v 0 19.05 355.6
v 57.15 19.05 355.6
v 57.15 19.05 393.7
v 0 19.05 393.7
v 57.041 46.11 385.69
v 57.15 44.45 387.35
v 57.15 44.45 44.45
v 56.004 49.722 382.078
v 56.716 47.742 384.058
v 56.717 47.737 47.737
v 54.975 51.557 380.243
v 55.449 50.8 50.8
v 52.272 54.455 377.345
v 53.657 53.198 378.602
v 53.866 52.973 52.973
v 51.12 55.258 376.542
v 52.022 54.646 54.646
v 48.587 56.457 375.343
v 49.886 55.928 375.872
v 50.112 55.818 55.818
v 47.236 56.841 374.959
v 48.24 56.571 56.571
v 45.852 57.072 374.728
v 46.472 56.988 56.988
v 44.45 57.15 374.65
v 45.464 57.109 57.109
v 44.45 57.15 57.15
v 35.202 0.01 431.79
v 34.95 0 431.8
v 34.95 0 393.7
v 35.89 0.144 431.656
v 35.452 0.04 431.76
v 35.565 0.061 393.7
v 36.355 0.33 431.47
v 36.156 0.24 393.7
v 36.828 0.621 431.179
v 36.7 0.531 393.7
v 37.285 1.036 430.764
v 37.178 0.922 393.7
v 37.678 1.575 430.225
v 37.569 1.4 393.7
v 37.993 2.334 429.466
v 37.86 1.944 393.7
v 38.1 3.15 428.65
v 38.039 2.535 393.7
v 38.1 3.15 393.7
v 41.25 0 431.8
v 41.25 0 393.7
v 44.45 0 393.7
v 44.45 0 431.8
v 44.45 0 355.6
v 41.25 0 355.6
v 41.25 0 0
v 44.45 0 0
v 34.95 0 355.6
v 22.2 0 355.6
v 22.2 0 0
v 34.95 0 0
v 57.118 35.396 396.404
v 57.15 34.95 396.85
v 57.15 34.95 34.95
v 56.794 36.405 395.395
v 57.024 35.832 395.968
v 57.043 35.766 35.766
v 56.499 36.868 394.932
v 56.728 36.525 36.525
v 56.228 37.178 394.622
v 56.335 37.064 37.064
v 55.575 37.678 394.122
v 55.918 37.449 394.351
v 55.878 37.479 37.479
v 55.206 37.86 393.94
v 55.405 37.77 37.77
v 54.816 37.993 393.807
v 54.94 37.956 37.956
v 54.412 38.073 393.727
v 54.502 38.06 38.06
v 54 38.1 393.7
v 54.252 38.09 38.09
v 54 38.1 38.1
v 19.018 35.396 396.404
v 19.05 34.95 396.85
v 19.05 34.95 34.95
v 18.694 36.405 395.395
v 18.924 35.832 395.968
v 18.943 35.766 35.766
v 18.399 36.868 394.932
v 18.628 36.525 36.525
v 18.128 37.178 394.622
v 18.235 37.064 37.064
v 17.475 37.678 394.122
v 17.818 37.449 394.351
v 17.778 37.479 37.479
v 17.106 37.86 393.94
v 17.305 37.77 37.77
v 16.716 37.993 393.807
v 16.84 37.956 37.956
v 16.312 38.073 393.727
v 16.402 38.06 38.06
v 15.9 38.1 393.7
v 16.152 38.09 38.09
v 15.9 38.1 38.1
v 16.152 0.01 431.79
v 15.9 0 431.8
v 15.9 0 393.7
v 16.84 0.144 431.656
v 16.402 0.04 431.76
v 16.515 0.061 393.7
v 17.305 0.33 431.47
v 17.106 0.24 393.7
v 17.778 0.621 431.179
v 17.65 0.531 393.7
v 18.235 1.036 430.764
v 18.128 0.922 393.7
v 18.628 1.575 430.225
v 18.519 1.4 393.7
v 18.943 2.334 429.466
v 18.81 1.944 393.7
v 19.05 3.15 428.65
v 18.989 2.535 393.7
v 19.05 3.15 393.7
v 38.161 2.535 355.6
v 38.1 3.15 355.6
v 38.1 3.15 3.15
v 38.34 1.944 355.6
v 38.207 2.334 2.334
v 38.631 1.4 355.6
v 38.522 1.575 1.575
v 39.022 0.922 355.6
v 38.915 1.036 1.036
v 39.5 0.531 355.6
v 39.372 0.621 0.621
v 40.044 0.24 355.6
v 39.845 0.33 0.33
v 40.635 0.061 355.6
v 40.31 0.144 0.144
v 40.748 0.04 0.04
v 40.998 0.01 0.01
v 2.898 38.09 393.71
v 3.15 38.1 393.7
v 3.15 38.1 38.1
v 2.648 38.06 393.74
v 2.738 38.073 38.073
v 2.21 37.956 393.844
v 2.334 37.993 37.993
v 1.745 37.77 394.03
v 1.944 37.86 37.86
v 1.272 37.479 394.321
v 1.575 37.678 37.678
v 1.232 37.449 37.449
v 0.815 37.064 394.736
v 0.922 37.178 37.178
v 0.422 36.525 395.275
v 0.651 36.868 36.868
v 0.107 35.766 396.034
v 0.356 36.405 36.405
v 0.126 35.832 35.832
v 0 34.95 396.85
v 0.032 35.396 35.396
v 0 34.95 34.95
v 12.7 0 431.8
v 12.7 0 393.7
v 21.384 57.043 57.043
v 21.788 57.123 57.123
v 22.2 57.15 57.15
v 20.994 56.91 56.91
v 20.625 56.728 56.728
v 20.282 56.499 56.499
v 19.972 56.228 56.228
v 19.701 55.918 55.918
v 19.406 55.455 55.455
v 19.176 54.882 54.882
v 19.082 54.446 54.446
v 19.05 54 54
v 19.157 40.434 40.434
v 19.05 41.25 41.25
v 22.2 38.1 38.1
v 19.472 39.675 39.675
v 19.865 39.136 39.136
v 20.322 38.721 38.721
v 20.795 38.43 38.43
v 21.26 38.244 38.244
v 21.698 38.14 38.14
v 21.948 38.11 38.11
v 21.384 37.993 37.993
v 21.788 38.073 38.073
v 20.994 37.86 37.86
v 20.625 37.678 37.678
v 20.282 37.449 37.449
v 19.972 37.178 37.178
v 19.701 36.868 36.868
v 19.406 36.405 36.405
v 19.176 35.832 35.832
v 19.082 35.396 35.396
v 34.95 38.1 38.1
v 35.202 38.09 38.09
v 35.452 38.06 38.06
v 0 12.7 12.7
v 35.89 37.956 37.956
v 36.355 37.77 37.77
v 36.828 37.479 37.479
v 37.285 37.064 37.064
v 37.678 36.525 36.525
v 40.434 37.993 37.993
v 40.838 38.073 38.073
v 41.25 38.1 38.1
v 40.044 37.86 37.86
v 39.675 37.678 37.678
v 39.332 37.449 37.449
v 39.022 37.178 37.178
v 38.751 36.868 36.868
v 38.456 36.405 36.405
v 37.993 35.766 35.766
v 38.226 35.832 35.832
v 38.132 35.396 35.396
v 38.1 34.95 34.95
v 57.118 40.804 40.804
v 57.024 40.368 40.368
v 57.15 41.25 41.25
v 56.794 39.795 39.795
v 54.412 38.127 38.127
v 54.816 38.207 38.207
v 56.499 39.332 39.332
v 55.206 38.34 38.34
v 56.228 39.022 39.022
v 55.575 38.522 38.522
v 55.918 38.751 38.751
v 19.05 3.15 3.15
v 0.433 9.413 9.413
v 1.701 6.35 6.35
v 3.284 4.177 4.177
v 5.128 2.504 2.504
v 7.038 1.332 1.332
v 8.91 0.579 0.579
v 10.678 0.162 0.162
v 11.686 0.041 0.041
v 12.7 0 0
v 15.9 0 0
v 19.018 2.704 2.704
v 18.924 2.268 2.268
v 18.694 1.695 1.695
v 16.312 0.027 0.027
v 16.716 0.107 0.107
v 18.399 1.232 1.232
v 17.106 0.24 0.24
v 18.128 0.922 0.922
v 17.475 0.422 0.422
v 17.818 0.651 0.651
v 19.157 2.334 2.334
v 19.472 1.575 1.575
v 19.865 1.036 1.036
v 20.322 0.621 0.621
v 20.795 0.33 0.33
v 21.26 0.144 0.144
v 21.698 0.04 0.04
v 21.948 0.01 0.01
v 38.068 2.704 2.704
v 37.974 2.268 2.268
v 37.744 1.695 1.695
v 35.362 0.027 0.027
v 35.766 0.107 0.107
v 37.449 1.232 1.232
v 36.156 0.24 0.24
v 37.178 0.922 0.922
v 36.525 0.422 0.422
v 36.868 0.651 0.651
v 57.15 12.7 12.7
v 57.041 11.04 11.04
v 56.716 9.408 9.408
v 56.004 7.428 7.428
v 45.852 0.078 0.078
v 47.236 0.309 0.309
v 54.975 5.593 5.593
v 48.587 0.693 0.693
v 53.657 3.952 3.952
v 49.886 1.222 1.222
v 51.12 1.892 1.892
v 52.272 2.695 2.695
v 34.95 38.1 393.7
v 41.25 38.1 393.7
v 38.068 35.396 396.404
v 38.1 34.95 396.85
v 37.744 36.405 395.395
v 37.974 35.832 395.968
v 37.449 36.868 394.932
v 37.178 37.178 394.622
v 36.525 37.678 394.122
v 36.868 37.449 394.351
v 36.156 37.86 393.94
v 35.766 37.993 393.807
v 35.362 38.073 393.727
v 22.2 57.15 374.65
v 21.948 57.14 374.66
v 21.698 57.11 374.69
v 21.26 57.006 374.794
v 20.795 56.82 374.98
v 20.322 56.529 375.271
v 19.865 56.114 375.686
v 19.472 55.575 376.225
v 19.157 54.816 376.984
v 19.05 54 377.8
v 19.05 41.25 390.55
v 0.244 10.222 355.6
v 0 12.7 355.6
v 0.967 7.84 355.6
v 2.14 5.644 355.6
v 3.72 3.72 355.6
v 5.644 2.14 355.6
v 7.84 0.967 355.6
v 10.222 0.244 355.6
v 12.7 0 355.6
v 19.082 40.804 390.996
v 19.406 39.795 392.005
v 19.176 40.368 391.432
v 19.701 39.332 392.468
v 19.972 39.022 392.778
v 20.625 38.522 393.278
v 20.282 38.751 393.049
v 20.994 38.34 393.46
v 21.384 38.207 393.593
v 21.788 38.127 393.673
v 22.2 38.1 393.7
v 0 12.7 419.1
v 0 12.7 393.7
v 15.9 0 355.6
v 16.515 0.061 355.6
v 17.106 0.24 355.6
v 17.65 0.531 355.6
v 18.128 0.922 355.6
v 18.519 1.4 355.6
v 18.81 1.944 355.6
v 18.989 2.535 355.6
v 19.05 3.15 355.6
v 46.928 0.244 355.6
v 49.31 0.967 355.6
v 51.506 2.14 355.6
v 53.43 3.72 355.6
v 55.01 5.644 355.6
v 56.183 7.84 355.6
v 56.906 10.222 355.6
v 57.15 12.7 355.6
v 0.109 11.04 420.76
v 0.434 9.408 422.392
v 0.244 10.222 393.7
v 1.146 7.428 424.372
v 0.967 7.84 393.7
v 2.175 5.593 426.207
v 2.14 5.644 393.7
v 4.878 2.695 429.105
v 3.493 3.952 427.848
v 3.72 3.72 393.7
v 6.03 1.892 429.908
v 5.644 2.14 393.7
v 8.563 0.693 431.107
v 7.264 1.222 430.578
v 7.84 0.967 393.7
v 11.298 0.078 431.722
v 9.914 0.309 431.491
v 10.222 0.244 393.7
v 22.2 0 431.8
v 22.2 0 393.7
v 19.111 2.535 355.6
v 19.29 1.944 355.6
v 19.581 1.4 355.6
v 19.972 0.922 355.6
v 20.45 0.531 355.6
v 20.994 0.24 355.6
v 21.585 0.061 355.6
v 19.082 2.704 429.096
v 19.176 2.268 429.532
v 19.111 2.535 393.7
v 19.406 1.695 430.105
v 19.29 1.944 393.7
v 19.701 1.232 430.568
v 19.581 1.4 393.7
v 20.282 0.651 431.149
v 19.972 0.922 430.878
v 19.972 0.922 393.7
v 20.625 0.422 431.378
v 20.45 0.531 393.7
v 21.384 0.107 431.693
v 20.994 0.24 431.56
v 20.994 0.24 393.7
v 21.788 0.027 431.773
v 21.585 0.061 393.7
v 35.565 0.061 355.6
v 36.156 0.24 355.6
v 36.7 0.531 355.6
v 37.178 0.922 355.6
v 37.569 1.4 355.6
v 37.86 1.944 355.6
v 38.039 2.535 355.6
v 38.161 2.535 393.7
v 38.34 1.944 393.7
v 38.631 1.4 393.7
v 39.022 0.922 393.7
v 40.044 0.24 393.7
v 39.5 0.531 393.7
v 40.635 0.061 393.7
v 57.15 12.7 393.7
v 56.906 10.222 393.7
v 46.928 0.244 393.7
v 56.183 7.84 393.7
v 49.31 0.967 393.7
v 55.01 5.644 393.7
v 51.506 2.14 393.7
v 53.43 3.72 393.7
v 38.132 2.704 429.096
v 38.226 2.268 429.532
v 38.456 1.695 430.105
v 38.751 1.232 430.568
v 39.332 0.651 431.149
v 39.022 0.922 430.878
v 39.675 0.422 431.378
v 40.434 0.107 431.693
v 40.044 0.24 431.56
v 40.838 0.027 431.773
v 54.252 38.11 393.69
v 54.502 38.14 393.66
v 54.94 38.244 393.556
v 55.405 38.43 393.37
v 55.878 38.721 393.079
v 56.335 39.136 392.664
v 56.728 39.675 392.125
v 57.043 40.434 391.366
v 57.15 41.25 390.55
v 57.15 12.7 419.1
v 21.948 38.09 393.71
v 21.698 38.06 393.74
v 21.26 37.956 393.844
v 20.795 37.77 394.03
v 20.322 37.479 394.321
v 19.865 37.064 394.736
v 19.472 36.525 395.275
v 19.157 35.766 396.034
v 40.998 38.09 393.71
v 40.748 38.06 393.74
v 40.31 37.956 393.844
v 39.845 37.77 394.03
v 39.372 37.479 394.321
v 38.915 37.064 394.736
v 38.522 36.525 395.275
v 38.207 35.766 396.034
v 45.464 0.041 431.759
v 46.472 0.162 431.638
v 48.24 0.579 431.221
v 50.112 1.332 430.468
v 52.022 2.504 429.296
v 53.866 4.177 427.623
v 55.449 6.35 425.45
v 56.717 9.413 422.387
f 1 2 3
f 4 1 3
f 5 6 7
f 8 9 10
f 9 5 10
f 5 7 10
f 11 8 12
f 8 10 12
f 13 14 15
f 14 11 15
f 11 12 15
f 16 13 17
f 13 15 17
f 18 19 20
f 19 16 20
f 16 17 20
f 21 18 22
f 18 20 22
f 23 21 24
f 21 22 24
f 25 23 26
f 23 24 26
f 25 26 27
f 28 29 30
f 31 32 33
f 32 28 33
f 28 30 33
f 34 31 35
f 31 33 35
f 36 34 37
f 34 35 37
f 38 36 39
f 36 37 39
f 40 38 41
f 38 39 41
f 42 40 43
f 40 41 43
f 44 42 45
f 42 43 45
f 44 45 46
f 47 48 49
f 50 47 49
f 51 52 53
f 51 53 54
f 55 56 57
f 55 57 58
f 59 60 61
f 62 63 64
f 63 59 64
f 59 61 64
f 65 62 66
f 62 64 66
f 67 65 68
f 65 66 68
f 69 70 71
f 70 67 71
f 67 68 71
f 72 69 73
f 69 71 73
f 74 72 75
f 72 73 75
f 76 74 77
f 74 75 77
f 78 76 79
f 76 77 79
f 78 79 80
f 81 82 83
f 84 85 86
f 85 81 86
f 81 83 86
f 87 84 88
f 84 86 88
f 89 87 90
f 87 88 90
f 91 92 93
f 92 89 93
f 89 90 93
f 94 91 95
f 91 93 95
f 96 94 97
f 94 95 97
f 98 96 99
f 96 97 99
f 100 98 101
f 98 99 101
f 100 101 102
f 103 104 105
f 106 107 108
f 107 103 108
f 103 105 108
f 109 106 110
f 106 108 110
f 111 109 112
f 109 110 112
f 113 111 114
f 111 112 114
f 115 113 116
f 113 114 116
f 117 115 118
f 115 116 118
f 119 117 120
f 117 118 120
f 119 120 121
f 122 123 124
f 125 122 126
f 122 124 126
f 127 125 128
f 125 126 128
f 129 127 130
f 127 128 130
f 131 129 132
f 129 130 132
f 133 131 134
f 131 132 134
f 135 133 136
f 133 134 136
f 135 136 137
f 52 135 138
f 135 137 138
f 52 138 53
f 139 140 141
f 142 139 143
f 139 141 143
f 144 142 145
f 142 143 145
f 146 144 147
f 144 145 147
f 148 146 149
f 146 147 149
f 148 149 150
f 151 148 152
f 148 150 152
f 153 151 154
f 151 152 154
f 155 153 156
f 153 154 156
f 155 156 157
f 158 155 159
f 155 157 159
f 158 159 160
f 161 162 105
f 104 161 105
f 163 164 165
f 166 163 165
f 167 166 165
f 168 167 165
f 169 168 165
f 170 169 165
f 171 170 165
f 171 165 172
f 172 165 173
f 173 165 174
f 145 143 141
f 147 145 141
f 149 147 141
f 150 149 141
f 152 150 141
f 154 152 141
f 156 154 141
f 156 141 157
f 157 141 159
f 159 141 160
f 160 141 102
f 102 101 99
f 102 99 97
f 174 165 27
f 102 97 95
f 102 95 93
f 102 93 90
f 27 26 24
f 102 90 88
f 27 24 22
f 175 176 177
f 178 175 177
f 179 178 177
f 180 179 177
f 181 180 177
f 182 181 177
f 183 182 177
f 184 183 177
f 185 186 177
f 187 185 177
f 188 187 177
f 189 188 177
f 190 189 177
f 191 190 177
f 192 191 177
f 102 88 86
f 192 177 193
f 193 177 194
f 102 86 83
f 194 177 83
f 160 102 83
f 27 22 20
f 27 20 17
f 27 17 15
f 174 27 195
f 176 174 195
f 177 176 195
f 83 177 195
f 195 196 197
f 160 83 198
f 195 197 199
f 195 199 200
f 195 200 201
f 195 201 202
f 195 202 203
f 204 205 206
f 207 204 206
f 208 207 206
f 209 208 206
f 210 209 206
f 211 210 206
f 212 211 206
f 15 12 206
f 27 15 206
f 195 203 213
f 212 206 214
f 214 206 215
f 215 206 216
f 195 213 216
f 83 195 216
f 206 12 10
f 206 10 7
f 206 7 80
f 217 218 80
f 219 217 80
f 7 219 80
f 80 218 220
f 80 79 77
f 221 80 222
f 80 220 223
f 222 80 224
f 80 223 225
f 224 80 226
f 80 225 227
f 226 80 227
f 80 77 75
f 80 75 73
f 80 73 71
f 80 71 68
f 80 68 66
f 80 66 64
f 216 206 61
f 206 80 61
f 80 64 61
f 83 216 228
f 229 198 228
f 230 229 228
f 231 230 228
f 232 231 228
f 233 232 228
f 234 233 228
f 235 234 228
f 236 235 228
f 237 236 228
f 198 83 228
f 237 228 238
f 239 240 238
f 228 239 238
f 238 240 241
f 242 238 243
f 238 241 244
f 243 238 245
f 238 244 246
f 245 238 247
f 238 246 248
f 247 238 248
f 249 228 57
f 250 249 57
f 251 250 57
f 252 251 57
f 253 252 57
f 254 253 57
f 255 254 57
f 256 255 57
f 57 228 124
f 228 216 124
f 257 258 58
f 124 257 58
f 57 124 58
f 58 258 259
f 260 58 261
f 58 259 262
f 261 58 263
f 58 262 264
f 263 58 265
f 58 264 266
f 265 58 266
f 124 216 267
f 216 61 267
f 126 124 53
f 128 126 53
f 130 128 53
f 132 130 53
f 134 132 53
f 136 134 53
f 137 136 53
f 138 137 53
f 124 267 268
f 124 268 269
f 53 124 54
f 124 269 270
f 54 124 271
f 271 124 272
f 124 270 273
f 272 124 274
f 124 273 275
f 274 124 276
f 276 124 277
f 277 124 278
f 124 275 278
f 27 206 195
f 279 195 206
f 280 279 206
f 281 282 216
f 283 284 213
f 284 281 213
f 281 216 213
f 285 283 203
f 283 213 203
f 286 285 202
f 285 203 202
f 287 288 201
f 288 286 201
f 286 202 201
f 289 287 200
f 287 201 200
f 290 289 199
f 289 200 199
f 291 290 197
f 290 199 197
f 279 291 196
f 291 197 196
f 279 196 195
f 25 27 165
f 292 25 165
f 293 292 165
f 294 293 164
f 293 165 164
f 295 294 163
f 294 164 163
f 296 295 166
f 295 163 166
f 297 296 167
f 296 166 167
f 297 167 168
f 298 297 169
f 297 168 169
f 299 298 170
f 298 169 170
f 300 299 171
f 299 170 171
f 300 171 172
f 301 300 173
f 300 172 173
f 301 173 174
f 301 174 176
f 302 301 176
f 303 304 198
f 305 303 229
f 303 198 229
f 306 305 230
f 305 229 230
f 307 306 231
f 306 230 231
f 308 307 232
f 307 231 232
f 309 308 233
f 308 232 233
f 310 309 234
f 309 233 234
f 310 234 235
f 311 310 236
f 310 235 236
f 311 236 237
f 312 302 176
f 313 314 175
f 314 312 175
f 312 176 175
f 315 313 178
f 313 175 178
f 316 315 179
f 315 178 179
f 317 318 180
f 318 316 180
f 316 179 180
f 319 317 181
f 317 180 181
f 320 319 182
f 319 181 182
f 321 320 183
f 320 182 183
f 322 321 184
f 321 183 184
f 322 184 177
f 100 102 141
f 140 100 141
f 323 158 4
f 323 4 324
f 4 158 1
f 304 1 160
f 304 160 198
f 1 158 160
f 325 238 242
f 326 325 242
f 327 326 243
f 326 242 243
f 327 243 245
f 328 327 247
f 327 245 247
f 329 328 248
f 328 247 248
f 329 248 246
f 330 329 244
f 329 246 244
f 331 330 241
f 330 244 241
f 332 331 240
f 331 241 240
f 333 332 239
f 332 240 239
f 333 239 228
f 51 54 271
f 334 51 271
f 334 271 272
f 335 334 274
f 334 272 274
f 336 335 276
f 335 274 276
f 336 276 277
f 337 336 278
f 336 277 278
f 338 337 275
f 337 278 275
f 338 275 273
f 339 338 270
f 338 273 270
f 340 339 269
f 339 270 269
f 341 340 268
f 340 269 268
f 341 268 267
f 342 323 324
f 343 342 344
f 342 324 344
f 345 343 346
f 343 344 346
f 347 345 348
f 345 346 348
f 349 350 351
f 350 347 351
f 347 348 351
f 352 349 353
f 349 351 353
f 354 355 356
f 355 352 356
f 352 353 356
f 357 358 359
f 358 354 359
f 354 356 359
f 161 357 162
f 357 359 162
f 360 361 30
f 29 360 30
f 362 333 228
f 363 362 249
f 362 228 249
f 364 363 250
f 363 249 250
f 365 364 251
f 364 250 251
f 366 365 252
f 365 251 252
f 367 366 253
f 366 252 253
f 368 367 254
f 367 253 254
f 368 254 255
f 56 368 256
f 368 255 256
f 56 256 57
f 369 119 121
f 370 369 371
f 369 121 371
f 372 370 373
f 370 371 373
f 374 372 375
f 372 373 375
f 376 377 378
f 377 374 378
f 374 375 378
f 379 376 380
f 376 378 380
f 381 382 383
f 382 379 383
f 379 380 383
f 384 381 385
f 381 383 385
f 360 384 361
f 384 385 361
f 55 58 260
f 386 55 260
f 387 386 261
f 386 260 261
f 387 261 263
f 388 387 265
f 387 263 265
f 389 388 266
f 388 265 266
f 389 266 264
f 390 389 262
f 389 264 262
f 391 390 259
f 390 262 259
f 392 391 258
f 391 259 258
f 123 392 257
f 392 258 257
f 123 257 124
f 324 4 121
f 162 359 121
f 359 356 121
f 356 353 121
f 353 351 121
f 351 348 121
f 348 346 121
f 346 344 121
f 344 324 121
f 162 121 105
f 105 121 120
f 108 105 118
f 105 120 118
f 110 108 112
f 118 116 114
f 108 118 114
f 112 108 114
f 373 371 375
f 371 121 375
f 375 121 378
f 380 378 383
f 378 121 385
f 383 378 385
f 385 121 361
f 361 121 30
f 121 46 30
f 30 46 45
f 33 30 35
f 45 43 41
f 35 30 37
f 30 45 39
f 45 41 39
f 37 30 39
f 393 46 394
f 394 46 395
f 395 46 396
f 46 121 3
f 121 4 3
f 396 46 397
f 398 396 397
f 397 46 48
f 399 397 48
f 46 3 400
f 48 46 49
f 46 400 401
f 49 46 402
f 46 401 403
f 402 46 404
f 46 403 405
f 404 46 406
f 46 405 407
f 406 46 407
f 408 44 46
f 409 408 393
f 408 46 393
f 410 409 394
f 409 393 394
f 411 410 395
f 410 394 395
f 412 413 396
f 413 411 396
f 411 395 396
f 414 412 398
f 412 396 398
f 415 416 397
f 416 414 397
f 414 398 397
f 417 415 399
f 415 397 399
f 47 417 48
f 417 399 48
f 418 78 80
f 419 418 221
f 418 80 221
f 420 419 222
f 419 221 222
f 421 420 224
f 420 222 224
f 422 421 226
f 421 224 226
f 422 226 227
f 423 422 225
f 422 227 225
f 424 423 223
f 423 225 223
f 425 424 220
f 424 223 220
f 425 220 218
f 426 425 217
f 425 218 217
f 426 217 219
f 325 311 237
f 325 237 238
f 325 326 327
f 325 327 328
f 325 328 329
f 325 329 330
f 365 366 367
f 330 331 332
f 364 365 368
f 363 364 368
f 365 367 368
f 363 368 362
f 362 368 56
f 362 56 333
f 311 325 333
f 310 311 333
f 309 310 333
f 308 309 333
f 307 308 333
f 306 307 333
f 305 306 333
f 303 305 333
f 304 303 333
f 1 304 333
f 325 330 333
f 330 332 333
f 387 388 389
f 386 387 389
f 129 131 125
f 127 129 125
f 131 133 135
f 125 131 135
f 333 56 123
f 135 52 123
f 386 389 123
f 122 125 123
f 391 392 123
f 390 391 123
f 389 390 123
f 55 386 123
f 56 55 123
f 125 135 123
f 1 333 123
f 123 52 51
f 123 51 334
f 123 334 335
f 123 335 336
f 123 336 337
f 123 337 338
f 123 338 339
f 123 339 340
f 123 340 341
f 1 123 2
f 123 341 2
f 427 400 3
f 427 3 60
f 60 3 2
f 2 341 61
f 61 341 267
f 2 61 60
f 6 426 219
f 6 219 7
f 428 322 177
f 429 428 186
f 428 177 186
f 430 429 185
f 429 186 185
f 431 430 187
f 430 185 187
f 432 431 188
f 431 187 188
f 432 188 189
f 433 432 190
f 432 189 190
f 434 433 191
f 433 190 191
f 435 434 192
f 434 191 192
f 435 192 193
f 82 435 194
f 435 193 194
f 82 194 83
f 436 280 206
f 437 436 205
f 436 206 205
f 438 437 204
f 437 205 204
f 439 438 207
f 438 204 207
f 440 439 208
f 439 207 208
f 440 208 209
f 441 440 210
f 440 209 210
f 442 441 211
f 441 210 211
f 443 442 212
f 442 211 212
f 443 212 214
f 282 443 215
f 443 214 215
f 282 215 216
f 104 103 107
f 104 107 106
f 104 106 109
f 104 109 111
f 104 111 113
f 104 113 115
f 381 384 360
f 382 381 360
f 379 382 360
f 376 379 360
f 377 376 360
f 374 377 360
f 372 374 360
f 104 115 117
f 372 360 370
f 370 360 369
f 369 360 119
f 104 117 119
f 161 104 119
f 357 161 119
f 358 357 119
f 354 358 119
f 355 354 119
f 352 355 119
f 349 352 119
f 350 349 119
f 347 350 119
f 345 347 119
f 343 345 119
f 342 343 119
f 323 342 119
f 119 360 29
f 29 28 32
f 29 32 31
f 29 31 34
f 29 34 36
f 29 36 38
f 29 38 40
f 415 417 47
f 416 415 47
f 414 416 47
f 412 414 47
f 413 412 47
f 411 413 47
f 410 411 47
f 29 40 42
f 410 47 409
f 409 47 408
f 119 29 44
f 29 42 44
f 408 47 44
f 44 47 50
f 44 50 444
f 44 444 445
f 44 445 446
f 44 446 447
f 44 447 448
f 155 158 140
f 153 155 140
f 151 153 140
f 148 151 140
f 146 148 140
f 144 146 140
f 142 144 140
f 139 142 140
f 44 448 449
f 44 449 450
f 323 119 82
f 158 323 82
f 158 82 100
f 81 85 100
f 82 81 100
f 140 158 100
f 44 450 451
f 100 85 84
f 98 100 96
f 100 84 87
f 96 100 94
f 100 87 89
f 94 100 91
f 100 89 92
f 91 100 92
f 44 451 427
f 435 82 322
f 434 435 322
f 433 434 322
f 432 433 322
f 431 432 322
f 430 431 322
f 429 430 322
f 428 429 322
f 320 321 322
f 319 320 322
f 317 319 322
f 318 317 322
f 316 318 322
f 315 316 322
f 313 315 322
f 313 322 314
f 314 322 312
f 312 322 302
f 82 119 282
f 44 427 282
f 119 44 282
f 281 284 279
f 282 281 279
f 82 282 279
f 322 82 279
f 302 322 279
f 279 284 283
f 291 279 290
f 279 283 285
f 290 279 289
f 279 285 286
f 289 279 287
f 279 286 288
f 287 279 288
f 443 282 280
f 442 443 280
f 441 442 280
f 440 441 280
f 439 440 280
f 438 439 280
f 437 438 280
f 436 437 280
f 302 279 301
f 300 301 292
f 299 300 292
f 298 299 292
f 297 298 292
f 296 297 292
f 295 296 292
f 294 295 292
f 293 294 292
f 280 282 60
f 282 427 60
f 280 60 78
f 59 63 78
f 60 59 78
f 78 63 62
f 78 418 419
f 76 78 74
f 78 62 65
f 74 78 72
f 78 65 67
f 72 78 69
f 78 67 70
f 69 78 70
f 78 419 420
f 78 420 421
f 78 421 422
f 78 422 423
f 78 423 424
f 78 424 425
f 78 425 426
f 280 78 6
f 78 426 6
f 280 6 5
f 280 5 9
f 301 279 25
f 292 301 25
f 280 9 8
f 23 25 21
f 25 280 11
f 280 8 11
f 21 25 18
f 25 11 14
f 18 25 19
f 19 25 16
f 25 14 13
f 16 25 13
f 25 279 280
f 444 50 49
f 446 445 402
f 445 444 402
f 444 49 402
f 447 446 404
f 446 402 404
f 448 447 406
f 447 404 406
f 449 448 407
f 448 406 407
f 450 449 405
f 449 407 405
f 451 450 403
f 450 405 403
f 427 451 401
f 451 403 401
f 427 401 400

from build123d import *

# Parameters (mm, degrees)
F1_DEPTH = 431.8
F3_DEPTH = 57.151
F4_W     = 12.7
F4_H     = 38.1
F4_W_2   = 6.35
F5_DEPTH = 57.151


# Not quite as in the source:
# - ends of sketch curves that miss each other by under 0.0002 mm in the source are joined


with BuildPart() as f1:
    # F0 (on Top) → F1 (new body)
    with BuildSketch(Plane.XY):
        with BuildLine():
            ThreePointArc((0, 12.7), (3.7197438789, 3.7197438789), (12.7, 0))
            Line((12.7, 0), (15.9004, 0))
            ThreePointArc((15.9004, 0), (18.127503518, 0.922496482), (19.05, 3.1496))
            Line((19.05, 3.1496), (19.05, 34.9504))
            ThreePointArc((19.05, 34.9504), (18.127503518, 37.177503518), (15.9004, 38.1))
            Line((15.9004, 38.1), (3.1496, 38.1))
            ThreePointArc((3.1496, 38.1), (0.922496482, 37.177503518), (0, 34.9504))
            Line((0, 34.9504), (0, 12.7))
        make_face()
        with BuildLine():
            Line((19.05, 34.9504), (19.05, 3.1496))
            ThreePointArc((19.05, 3.1496), (19.972496482, 0.922496482), (22.1996, 0))
            Line((22.1996, 0), (34.9504, 0))
            ThreePointArc((34.9504, 0), (37.177503518, 0.922496482), (38.1, 3.1496))
            Line((38.1, 3.1496), (38.1, 34.9504))
            ThreePointArc((38.1, 34.9504), (37.177503518, 37.177503518), (34.9504, 38.1))
            Line((34.9504, 38.1), (22.1996, 38.1))
            ThreePointArc((22.1996, 38.1), (19.972496482, 37.177503518), (19.05, 34.9504))
        make_face()
        with BuildLine():
            Line((38.1, 34.9504), (38.1, 3.1496))
            ThreePointArc((38.1, 3.1496), (39.022496482, 0.922496482), (41.2496, 0))
            Line((41.2496, 0), (44.45, 0))
            ThreePointArc((44.45, 0), (53.4302561211, 3.7197438789), (57.15, 12.7))
            Line((57.15, 12.7), (57.15, 34.9504))
            ThreePointArc((57.15, 34.9504), (56.227503518, 37.177503518), (54.0004, 38.1))
            Line((54.0004, 38.1), (41.2496, 38.1))
            ThreePointArc((41.2496, 38.1), (39.022496482, 37.177503518), (38.1, 34.9504))
        make_face()
        with BuildLine():
            ThreePointArc((19.0499988437, 41.2496), (19.9724953256, 39.022496482), (22.1995988437, 38.1))
            Line((22.1995988437, 38.1), (34.9504, 38.1))
            Line((34.9504, 38.1), (41.2496, 38.1))
            Line((41.2496, 38.1), (54.0004, 38.1))
            ThreePointArc((54.0004, 38.1), (56.2275023617, 39.022496482), (57.1499988437, 41.2496))
            Line((57.1499988437, 41.2496), (57.1499988437, 44.45))
            ThreePointArc((57.1499988437, 44.45), (53.4302549647, 53.4302561211), (44.4499988437, 57.15))
            Line((44.4499988437, 57.15), (22.1995988437, 57.15))
            ThreePointArc((22.1995988437, 57.15), (19.9724953256, 56.227503518), (19.0499988437, 54.0004))
            Line((19.0499988437, 54.0004), (19.0499988437, 41.2496))
        make_face()
    extrude(amount=F1_DEPTH)

    # F2 (on face) → F3 (cut, through all)
    with BuildSketch(Plane.YZ.offset(57.15)):
        Polygon((57.15, 0), (57.15, 57.15), (0, 0), (12.7, 0), align=None)
        Polygon((12.7, 431.8), (0, 431.8), (57.15, 374.65), (57.15, 431.8), align=None)
    extrude(amount=-F3_DEPTH, mode=Mode.SUBTRACT)

    # F4 (on face) → F5 (cut, through all)
    with BuildSketch(Plane.YZ.offset(57.15)):
        with Locations((6.35, 374.65)):
            Rectangle(F4_W, F4_H)
        with Locations((15.875, 374.65)):
            Rectangle(F4_W_2, F4_H)
    extrude(amount=-F5_DEPTH, mode=Mode.SUBTRACT)


solid = f1.part
